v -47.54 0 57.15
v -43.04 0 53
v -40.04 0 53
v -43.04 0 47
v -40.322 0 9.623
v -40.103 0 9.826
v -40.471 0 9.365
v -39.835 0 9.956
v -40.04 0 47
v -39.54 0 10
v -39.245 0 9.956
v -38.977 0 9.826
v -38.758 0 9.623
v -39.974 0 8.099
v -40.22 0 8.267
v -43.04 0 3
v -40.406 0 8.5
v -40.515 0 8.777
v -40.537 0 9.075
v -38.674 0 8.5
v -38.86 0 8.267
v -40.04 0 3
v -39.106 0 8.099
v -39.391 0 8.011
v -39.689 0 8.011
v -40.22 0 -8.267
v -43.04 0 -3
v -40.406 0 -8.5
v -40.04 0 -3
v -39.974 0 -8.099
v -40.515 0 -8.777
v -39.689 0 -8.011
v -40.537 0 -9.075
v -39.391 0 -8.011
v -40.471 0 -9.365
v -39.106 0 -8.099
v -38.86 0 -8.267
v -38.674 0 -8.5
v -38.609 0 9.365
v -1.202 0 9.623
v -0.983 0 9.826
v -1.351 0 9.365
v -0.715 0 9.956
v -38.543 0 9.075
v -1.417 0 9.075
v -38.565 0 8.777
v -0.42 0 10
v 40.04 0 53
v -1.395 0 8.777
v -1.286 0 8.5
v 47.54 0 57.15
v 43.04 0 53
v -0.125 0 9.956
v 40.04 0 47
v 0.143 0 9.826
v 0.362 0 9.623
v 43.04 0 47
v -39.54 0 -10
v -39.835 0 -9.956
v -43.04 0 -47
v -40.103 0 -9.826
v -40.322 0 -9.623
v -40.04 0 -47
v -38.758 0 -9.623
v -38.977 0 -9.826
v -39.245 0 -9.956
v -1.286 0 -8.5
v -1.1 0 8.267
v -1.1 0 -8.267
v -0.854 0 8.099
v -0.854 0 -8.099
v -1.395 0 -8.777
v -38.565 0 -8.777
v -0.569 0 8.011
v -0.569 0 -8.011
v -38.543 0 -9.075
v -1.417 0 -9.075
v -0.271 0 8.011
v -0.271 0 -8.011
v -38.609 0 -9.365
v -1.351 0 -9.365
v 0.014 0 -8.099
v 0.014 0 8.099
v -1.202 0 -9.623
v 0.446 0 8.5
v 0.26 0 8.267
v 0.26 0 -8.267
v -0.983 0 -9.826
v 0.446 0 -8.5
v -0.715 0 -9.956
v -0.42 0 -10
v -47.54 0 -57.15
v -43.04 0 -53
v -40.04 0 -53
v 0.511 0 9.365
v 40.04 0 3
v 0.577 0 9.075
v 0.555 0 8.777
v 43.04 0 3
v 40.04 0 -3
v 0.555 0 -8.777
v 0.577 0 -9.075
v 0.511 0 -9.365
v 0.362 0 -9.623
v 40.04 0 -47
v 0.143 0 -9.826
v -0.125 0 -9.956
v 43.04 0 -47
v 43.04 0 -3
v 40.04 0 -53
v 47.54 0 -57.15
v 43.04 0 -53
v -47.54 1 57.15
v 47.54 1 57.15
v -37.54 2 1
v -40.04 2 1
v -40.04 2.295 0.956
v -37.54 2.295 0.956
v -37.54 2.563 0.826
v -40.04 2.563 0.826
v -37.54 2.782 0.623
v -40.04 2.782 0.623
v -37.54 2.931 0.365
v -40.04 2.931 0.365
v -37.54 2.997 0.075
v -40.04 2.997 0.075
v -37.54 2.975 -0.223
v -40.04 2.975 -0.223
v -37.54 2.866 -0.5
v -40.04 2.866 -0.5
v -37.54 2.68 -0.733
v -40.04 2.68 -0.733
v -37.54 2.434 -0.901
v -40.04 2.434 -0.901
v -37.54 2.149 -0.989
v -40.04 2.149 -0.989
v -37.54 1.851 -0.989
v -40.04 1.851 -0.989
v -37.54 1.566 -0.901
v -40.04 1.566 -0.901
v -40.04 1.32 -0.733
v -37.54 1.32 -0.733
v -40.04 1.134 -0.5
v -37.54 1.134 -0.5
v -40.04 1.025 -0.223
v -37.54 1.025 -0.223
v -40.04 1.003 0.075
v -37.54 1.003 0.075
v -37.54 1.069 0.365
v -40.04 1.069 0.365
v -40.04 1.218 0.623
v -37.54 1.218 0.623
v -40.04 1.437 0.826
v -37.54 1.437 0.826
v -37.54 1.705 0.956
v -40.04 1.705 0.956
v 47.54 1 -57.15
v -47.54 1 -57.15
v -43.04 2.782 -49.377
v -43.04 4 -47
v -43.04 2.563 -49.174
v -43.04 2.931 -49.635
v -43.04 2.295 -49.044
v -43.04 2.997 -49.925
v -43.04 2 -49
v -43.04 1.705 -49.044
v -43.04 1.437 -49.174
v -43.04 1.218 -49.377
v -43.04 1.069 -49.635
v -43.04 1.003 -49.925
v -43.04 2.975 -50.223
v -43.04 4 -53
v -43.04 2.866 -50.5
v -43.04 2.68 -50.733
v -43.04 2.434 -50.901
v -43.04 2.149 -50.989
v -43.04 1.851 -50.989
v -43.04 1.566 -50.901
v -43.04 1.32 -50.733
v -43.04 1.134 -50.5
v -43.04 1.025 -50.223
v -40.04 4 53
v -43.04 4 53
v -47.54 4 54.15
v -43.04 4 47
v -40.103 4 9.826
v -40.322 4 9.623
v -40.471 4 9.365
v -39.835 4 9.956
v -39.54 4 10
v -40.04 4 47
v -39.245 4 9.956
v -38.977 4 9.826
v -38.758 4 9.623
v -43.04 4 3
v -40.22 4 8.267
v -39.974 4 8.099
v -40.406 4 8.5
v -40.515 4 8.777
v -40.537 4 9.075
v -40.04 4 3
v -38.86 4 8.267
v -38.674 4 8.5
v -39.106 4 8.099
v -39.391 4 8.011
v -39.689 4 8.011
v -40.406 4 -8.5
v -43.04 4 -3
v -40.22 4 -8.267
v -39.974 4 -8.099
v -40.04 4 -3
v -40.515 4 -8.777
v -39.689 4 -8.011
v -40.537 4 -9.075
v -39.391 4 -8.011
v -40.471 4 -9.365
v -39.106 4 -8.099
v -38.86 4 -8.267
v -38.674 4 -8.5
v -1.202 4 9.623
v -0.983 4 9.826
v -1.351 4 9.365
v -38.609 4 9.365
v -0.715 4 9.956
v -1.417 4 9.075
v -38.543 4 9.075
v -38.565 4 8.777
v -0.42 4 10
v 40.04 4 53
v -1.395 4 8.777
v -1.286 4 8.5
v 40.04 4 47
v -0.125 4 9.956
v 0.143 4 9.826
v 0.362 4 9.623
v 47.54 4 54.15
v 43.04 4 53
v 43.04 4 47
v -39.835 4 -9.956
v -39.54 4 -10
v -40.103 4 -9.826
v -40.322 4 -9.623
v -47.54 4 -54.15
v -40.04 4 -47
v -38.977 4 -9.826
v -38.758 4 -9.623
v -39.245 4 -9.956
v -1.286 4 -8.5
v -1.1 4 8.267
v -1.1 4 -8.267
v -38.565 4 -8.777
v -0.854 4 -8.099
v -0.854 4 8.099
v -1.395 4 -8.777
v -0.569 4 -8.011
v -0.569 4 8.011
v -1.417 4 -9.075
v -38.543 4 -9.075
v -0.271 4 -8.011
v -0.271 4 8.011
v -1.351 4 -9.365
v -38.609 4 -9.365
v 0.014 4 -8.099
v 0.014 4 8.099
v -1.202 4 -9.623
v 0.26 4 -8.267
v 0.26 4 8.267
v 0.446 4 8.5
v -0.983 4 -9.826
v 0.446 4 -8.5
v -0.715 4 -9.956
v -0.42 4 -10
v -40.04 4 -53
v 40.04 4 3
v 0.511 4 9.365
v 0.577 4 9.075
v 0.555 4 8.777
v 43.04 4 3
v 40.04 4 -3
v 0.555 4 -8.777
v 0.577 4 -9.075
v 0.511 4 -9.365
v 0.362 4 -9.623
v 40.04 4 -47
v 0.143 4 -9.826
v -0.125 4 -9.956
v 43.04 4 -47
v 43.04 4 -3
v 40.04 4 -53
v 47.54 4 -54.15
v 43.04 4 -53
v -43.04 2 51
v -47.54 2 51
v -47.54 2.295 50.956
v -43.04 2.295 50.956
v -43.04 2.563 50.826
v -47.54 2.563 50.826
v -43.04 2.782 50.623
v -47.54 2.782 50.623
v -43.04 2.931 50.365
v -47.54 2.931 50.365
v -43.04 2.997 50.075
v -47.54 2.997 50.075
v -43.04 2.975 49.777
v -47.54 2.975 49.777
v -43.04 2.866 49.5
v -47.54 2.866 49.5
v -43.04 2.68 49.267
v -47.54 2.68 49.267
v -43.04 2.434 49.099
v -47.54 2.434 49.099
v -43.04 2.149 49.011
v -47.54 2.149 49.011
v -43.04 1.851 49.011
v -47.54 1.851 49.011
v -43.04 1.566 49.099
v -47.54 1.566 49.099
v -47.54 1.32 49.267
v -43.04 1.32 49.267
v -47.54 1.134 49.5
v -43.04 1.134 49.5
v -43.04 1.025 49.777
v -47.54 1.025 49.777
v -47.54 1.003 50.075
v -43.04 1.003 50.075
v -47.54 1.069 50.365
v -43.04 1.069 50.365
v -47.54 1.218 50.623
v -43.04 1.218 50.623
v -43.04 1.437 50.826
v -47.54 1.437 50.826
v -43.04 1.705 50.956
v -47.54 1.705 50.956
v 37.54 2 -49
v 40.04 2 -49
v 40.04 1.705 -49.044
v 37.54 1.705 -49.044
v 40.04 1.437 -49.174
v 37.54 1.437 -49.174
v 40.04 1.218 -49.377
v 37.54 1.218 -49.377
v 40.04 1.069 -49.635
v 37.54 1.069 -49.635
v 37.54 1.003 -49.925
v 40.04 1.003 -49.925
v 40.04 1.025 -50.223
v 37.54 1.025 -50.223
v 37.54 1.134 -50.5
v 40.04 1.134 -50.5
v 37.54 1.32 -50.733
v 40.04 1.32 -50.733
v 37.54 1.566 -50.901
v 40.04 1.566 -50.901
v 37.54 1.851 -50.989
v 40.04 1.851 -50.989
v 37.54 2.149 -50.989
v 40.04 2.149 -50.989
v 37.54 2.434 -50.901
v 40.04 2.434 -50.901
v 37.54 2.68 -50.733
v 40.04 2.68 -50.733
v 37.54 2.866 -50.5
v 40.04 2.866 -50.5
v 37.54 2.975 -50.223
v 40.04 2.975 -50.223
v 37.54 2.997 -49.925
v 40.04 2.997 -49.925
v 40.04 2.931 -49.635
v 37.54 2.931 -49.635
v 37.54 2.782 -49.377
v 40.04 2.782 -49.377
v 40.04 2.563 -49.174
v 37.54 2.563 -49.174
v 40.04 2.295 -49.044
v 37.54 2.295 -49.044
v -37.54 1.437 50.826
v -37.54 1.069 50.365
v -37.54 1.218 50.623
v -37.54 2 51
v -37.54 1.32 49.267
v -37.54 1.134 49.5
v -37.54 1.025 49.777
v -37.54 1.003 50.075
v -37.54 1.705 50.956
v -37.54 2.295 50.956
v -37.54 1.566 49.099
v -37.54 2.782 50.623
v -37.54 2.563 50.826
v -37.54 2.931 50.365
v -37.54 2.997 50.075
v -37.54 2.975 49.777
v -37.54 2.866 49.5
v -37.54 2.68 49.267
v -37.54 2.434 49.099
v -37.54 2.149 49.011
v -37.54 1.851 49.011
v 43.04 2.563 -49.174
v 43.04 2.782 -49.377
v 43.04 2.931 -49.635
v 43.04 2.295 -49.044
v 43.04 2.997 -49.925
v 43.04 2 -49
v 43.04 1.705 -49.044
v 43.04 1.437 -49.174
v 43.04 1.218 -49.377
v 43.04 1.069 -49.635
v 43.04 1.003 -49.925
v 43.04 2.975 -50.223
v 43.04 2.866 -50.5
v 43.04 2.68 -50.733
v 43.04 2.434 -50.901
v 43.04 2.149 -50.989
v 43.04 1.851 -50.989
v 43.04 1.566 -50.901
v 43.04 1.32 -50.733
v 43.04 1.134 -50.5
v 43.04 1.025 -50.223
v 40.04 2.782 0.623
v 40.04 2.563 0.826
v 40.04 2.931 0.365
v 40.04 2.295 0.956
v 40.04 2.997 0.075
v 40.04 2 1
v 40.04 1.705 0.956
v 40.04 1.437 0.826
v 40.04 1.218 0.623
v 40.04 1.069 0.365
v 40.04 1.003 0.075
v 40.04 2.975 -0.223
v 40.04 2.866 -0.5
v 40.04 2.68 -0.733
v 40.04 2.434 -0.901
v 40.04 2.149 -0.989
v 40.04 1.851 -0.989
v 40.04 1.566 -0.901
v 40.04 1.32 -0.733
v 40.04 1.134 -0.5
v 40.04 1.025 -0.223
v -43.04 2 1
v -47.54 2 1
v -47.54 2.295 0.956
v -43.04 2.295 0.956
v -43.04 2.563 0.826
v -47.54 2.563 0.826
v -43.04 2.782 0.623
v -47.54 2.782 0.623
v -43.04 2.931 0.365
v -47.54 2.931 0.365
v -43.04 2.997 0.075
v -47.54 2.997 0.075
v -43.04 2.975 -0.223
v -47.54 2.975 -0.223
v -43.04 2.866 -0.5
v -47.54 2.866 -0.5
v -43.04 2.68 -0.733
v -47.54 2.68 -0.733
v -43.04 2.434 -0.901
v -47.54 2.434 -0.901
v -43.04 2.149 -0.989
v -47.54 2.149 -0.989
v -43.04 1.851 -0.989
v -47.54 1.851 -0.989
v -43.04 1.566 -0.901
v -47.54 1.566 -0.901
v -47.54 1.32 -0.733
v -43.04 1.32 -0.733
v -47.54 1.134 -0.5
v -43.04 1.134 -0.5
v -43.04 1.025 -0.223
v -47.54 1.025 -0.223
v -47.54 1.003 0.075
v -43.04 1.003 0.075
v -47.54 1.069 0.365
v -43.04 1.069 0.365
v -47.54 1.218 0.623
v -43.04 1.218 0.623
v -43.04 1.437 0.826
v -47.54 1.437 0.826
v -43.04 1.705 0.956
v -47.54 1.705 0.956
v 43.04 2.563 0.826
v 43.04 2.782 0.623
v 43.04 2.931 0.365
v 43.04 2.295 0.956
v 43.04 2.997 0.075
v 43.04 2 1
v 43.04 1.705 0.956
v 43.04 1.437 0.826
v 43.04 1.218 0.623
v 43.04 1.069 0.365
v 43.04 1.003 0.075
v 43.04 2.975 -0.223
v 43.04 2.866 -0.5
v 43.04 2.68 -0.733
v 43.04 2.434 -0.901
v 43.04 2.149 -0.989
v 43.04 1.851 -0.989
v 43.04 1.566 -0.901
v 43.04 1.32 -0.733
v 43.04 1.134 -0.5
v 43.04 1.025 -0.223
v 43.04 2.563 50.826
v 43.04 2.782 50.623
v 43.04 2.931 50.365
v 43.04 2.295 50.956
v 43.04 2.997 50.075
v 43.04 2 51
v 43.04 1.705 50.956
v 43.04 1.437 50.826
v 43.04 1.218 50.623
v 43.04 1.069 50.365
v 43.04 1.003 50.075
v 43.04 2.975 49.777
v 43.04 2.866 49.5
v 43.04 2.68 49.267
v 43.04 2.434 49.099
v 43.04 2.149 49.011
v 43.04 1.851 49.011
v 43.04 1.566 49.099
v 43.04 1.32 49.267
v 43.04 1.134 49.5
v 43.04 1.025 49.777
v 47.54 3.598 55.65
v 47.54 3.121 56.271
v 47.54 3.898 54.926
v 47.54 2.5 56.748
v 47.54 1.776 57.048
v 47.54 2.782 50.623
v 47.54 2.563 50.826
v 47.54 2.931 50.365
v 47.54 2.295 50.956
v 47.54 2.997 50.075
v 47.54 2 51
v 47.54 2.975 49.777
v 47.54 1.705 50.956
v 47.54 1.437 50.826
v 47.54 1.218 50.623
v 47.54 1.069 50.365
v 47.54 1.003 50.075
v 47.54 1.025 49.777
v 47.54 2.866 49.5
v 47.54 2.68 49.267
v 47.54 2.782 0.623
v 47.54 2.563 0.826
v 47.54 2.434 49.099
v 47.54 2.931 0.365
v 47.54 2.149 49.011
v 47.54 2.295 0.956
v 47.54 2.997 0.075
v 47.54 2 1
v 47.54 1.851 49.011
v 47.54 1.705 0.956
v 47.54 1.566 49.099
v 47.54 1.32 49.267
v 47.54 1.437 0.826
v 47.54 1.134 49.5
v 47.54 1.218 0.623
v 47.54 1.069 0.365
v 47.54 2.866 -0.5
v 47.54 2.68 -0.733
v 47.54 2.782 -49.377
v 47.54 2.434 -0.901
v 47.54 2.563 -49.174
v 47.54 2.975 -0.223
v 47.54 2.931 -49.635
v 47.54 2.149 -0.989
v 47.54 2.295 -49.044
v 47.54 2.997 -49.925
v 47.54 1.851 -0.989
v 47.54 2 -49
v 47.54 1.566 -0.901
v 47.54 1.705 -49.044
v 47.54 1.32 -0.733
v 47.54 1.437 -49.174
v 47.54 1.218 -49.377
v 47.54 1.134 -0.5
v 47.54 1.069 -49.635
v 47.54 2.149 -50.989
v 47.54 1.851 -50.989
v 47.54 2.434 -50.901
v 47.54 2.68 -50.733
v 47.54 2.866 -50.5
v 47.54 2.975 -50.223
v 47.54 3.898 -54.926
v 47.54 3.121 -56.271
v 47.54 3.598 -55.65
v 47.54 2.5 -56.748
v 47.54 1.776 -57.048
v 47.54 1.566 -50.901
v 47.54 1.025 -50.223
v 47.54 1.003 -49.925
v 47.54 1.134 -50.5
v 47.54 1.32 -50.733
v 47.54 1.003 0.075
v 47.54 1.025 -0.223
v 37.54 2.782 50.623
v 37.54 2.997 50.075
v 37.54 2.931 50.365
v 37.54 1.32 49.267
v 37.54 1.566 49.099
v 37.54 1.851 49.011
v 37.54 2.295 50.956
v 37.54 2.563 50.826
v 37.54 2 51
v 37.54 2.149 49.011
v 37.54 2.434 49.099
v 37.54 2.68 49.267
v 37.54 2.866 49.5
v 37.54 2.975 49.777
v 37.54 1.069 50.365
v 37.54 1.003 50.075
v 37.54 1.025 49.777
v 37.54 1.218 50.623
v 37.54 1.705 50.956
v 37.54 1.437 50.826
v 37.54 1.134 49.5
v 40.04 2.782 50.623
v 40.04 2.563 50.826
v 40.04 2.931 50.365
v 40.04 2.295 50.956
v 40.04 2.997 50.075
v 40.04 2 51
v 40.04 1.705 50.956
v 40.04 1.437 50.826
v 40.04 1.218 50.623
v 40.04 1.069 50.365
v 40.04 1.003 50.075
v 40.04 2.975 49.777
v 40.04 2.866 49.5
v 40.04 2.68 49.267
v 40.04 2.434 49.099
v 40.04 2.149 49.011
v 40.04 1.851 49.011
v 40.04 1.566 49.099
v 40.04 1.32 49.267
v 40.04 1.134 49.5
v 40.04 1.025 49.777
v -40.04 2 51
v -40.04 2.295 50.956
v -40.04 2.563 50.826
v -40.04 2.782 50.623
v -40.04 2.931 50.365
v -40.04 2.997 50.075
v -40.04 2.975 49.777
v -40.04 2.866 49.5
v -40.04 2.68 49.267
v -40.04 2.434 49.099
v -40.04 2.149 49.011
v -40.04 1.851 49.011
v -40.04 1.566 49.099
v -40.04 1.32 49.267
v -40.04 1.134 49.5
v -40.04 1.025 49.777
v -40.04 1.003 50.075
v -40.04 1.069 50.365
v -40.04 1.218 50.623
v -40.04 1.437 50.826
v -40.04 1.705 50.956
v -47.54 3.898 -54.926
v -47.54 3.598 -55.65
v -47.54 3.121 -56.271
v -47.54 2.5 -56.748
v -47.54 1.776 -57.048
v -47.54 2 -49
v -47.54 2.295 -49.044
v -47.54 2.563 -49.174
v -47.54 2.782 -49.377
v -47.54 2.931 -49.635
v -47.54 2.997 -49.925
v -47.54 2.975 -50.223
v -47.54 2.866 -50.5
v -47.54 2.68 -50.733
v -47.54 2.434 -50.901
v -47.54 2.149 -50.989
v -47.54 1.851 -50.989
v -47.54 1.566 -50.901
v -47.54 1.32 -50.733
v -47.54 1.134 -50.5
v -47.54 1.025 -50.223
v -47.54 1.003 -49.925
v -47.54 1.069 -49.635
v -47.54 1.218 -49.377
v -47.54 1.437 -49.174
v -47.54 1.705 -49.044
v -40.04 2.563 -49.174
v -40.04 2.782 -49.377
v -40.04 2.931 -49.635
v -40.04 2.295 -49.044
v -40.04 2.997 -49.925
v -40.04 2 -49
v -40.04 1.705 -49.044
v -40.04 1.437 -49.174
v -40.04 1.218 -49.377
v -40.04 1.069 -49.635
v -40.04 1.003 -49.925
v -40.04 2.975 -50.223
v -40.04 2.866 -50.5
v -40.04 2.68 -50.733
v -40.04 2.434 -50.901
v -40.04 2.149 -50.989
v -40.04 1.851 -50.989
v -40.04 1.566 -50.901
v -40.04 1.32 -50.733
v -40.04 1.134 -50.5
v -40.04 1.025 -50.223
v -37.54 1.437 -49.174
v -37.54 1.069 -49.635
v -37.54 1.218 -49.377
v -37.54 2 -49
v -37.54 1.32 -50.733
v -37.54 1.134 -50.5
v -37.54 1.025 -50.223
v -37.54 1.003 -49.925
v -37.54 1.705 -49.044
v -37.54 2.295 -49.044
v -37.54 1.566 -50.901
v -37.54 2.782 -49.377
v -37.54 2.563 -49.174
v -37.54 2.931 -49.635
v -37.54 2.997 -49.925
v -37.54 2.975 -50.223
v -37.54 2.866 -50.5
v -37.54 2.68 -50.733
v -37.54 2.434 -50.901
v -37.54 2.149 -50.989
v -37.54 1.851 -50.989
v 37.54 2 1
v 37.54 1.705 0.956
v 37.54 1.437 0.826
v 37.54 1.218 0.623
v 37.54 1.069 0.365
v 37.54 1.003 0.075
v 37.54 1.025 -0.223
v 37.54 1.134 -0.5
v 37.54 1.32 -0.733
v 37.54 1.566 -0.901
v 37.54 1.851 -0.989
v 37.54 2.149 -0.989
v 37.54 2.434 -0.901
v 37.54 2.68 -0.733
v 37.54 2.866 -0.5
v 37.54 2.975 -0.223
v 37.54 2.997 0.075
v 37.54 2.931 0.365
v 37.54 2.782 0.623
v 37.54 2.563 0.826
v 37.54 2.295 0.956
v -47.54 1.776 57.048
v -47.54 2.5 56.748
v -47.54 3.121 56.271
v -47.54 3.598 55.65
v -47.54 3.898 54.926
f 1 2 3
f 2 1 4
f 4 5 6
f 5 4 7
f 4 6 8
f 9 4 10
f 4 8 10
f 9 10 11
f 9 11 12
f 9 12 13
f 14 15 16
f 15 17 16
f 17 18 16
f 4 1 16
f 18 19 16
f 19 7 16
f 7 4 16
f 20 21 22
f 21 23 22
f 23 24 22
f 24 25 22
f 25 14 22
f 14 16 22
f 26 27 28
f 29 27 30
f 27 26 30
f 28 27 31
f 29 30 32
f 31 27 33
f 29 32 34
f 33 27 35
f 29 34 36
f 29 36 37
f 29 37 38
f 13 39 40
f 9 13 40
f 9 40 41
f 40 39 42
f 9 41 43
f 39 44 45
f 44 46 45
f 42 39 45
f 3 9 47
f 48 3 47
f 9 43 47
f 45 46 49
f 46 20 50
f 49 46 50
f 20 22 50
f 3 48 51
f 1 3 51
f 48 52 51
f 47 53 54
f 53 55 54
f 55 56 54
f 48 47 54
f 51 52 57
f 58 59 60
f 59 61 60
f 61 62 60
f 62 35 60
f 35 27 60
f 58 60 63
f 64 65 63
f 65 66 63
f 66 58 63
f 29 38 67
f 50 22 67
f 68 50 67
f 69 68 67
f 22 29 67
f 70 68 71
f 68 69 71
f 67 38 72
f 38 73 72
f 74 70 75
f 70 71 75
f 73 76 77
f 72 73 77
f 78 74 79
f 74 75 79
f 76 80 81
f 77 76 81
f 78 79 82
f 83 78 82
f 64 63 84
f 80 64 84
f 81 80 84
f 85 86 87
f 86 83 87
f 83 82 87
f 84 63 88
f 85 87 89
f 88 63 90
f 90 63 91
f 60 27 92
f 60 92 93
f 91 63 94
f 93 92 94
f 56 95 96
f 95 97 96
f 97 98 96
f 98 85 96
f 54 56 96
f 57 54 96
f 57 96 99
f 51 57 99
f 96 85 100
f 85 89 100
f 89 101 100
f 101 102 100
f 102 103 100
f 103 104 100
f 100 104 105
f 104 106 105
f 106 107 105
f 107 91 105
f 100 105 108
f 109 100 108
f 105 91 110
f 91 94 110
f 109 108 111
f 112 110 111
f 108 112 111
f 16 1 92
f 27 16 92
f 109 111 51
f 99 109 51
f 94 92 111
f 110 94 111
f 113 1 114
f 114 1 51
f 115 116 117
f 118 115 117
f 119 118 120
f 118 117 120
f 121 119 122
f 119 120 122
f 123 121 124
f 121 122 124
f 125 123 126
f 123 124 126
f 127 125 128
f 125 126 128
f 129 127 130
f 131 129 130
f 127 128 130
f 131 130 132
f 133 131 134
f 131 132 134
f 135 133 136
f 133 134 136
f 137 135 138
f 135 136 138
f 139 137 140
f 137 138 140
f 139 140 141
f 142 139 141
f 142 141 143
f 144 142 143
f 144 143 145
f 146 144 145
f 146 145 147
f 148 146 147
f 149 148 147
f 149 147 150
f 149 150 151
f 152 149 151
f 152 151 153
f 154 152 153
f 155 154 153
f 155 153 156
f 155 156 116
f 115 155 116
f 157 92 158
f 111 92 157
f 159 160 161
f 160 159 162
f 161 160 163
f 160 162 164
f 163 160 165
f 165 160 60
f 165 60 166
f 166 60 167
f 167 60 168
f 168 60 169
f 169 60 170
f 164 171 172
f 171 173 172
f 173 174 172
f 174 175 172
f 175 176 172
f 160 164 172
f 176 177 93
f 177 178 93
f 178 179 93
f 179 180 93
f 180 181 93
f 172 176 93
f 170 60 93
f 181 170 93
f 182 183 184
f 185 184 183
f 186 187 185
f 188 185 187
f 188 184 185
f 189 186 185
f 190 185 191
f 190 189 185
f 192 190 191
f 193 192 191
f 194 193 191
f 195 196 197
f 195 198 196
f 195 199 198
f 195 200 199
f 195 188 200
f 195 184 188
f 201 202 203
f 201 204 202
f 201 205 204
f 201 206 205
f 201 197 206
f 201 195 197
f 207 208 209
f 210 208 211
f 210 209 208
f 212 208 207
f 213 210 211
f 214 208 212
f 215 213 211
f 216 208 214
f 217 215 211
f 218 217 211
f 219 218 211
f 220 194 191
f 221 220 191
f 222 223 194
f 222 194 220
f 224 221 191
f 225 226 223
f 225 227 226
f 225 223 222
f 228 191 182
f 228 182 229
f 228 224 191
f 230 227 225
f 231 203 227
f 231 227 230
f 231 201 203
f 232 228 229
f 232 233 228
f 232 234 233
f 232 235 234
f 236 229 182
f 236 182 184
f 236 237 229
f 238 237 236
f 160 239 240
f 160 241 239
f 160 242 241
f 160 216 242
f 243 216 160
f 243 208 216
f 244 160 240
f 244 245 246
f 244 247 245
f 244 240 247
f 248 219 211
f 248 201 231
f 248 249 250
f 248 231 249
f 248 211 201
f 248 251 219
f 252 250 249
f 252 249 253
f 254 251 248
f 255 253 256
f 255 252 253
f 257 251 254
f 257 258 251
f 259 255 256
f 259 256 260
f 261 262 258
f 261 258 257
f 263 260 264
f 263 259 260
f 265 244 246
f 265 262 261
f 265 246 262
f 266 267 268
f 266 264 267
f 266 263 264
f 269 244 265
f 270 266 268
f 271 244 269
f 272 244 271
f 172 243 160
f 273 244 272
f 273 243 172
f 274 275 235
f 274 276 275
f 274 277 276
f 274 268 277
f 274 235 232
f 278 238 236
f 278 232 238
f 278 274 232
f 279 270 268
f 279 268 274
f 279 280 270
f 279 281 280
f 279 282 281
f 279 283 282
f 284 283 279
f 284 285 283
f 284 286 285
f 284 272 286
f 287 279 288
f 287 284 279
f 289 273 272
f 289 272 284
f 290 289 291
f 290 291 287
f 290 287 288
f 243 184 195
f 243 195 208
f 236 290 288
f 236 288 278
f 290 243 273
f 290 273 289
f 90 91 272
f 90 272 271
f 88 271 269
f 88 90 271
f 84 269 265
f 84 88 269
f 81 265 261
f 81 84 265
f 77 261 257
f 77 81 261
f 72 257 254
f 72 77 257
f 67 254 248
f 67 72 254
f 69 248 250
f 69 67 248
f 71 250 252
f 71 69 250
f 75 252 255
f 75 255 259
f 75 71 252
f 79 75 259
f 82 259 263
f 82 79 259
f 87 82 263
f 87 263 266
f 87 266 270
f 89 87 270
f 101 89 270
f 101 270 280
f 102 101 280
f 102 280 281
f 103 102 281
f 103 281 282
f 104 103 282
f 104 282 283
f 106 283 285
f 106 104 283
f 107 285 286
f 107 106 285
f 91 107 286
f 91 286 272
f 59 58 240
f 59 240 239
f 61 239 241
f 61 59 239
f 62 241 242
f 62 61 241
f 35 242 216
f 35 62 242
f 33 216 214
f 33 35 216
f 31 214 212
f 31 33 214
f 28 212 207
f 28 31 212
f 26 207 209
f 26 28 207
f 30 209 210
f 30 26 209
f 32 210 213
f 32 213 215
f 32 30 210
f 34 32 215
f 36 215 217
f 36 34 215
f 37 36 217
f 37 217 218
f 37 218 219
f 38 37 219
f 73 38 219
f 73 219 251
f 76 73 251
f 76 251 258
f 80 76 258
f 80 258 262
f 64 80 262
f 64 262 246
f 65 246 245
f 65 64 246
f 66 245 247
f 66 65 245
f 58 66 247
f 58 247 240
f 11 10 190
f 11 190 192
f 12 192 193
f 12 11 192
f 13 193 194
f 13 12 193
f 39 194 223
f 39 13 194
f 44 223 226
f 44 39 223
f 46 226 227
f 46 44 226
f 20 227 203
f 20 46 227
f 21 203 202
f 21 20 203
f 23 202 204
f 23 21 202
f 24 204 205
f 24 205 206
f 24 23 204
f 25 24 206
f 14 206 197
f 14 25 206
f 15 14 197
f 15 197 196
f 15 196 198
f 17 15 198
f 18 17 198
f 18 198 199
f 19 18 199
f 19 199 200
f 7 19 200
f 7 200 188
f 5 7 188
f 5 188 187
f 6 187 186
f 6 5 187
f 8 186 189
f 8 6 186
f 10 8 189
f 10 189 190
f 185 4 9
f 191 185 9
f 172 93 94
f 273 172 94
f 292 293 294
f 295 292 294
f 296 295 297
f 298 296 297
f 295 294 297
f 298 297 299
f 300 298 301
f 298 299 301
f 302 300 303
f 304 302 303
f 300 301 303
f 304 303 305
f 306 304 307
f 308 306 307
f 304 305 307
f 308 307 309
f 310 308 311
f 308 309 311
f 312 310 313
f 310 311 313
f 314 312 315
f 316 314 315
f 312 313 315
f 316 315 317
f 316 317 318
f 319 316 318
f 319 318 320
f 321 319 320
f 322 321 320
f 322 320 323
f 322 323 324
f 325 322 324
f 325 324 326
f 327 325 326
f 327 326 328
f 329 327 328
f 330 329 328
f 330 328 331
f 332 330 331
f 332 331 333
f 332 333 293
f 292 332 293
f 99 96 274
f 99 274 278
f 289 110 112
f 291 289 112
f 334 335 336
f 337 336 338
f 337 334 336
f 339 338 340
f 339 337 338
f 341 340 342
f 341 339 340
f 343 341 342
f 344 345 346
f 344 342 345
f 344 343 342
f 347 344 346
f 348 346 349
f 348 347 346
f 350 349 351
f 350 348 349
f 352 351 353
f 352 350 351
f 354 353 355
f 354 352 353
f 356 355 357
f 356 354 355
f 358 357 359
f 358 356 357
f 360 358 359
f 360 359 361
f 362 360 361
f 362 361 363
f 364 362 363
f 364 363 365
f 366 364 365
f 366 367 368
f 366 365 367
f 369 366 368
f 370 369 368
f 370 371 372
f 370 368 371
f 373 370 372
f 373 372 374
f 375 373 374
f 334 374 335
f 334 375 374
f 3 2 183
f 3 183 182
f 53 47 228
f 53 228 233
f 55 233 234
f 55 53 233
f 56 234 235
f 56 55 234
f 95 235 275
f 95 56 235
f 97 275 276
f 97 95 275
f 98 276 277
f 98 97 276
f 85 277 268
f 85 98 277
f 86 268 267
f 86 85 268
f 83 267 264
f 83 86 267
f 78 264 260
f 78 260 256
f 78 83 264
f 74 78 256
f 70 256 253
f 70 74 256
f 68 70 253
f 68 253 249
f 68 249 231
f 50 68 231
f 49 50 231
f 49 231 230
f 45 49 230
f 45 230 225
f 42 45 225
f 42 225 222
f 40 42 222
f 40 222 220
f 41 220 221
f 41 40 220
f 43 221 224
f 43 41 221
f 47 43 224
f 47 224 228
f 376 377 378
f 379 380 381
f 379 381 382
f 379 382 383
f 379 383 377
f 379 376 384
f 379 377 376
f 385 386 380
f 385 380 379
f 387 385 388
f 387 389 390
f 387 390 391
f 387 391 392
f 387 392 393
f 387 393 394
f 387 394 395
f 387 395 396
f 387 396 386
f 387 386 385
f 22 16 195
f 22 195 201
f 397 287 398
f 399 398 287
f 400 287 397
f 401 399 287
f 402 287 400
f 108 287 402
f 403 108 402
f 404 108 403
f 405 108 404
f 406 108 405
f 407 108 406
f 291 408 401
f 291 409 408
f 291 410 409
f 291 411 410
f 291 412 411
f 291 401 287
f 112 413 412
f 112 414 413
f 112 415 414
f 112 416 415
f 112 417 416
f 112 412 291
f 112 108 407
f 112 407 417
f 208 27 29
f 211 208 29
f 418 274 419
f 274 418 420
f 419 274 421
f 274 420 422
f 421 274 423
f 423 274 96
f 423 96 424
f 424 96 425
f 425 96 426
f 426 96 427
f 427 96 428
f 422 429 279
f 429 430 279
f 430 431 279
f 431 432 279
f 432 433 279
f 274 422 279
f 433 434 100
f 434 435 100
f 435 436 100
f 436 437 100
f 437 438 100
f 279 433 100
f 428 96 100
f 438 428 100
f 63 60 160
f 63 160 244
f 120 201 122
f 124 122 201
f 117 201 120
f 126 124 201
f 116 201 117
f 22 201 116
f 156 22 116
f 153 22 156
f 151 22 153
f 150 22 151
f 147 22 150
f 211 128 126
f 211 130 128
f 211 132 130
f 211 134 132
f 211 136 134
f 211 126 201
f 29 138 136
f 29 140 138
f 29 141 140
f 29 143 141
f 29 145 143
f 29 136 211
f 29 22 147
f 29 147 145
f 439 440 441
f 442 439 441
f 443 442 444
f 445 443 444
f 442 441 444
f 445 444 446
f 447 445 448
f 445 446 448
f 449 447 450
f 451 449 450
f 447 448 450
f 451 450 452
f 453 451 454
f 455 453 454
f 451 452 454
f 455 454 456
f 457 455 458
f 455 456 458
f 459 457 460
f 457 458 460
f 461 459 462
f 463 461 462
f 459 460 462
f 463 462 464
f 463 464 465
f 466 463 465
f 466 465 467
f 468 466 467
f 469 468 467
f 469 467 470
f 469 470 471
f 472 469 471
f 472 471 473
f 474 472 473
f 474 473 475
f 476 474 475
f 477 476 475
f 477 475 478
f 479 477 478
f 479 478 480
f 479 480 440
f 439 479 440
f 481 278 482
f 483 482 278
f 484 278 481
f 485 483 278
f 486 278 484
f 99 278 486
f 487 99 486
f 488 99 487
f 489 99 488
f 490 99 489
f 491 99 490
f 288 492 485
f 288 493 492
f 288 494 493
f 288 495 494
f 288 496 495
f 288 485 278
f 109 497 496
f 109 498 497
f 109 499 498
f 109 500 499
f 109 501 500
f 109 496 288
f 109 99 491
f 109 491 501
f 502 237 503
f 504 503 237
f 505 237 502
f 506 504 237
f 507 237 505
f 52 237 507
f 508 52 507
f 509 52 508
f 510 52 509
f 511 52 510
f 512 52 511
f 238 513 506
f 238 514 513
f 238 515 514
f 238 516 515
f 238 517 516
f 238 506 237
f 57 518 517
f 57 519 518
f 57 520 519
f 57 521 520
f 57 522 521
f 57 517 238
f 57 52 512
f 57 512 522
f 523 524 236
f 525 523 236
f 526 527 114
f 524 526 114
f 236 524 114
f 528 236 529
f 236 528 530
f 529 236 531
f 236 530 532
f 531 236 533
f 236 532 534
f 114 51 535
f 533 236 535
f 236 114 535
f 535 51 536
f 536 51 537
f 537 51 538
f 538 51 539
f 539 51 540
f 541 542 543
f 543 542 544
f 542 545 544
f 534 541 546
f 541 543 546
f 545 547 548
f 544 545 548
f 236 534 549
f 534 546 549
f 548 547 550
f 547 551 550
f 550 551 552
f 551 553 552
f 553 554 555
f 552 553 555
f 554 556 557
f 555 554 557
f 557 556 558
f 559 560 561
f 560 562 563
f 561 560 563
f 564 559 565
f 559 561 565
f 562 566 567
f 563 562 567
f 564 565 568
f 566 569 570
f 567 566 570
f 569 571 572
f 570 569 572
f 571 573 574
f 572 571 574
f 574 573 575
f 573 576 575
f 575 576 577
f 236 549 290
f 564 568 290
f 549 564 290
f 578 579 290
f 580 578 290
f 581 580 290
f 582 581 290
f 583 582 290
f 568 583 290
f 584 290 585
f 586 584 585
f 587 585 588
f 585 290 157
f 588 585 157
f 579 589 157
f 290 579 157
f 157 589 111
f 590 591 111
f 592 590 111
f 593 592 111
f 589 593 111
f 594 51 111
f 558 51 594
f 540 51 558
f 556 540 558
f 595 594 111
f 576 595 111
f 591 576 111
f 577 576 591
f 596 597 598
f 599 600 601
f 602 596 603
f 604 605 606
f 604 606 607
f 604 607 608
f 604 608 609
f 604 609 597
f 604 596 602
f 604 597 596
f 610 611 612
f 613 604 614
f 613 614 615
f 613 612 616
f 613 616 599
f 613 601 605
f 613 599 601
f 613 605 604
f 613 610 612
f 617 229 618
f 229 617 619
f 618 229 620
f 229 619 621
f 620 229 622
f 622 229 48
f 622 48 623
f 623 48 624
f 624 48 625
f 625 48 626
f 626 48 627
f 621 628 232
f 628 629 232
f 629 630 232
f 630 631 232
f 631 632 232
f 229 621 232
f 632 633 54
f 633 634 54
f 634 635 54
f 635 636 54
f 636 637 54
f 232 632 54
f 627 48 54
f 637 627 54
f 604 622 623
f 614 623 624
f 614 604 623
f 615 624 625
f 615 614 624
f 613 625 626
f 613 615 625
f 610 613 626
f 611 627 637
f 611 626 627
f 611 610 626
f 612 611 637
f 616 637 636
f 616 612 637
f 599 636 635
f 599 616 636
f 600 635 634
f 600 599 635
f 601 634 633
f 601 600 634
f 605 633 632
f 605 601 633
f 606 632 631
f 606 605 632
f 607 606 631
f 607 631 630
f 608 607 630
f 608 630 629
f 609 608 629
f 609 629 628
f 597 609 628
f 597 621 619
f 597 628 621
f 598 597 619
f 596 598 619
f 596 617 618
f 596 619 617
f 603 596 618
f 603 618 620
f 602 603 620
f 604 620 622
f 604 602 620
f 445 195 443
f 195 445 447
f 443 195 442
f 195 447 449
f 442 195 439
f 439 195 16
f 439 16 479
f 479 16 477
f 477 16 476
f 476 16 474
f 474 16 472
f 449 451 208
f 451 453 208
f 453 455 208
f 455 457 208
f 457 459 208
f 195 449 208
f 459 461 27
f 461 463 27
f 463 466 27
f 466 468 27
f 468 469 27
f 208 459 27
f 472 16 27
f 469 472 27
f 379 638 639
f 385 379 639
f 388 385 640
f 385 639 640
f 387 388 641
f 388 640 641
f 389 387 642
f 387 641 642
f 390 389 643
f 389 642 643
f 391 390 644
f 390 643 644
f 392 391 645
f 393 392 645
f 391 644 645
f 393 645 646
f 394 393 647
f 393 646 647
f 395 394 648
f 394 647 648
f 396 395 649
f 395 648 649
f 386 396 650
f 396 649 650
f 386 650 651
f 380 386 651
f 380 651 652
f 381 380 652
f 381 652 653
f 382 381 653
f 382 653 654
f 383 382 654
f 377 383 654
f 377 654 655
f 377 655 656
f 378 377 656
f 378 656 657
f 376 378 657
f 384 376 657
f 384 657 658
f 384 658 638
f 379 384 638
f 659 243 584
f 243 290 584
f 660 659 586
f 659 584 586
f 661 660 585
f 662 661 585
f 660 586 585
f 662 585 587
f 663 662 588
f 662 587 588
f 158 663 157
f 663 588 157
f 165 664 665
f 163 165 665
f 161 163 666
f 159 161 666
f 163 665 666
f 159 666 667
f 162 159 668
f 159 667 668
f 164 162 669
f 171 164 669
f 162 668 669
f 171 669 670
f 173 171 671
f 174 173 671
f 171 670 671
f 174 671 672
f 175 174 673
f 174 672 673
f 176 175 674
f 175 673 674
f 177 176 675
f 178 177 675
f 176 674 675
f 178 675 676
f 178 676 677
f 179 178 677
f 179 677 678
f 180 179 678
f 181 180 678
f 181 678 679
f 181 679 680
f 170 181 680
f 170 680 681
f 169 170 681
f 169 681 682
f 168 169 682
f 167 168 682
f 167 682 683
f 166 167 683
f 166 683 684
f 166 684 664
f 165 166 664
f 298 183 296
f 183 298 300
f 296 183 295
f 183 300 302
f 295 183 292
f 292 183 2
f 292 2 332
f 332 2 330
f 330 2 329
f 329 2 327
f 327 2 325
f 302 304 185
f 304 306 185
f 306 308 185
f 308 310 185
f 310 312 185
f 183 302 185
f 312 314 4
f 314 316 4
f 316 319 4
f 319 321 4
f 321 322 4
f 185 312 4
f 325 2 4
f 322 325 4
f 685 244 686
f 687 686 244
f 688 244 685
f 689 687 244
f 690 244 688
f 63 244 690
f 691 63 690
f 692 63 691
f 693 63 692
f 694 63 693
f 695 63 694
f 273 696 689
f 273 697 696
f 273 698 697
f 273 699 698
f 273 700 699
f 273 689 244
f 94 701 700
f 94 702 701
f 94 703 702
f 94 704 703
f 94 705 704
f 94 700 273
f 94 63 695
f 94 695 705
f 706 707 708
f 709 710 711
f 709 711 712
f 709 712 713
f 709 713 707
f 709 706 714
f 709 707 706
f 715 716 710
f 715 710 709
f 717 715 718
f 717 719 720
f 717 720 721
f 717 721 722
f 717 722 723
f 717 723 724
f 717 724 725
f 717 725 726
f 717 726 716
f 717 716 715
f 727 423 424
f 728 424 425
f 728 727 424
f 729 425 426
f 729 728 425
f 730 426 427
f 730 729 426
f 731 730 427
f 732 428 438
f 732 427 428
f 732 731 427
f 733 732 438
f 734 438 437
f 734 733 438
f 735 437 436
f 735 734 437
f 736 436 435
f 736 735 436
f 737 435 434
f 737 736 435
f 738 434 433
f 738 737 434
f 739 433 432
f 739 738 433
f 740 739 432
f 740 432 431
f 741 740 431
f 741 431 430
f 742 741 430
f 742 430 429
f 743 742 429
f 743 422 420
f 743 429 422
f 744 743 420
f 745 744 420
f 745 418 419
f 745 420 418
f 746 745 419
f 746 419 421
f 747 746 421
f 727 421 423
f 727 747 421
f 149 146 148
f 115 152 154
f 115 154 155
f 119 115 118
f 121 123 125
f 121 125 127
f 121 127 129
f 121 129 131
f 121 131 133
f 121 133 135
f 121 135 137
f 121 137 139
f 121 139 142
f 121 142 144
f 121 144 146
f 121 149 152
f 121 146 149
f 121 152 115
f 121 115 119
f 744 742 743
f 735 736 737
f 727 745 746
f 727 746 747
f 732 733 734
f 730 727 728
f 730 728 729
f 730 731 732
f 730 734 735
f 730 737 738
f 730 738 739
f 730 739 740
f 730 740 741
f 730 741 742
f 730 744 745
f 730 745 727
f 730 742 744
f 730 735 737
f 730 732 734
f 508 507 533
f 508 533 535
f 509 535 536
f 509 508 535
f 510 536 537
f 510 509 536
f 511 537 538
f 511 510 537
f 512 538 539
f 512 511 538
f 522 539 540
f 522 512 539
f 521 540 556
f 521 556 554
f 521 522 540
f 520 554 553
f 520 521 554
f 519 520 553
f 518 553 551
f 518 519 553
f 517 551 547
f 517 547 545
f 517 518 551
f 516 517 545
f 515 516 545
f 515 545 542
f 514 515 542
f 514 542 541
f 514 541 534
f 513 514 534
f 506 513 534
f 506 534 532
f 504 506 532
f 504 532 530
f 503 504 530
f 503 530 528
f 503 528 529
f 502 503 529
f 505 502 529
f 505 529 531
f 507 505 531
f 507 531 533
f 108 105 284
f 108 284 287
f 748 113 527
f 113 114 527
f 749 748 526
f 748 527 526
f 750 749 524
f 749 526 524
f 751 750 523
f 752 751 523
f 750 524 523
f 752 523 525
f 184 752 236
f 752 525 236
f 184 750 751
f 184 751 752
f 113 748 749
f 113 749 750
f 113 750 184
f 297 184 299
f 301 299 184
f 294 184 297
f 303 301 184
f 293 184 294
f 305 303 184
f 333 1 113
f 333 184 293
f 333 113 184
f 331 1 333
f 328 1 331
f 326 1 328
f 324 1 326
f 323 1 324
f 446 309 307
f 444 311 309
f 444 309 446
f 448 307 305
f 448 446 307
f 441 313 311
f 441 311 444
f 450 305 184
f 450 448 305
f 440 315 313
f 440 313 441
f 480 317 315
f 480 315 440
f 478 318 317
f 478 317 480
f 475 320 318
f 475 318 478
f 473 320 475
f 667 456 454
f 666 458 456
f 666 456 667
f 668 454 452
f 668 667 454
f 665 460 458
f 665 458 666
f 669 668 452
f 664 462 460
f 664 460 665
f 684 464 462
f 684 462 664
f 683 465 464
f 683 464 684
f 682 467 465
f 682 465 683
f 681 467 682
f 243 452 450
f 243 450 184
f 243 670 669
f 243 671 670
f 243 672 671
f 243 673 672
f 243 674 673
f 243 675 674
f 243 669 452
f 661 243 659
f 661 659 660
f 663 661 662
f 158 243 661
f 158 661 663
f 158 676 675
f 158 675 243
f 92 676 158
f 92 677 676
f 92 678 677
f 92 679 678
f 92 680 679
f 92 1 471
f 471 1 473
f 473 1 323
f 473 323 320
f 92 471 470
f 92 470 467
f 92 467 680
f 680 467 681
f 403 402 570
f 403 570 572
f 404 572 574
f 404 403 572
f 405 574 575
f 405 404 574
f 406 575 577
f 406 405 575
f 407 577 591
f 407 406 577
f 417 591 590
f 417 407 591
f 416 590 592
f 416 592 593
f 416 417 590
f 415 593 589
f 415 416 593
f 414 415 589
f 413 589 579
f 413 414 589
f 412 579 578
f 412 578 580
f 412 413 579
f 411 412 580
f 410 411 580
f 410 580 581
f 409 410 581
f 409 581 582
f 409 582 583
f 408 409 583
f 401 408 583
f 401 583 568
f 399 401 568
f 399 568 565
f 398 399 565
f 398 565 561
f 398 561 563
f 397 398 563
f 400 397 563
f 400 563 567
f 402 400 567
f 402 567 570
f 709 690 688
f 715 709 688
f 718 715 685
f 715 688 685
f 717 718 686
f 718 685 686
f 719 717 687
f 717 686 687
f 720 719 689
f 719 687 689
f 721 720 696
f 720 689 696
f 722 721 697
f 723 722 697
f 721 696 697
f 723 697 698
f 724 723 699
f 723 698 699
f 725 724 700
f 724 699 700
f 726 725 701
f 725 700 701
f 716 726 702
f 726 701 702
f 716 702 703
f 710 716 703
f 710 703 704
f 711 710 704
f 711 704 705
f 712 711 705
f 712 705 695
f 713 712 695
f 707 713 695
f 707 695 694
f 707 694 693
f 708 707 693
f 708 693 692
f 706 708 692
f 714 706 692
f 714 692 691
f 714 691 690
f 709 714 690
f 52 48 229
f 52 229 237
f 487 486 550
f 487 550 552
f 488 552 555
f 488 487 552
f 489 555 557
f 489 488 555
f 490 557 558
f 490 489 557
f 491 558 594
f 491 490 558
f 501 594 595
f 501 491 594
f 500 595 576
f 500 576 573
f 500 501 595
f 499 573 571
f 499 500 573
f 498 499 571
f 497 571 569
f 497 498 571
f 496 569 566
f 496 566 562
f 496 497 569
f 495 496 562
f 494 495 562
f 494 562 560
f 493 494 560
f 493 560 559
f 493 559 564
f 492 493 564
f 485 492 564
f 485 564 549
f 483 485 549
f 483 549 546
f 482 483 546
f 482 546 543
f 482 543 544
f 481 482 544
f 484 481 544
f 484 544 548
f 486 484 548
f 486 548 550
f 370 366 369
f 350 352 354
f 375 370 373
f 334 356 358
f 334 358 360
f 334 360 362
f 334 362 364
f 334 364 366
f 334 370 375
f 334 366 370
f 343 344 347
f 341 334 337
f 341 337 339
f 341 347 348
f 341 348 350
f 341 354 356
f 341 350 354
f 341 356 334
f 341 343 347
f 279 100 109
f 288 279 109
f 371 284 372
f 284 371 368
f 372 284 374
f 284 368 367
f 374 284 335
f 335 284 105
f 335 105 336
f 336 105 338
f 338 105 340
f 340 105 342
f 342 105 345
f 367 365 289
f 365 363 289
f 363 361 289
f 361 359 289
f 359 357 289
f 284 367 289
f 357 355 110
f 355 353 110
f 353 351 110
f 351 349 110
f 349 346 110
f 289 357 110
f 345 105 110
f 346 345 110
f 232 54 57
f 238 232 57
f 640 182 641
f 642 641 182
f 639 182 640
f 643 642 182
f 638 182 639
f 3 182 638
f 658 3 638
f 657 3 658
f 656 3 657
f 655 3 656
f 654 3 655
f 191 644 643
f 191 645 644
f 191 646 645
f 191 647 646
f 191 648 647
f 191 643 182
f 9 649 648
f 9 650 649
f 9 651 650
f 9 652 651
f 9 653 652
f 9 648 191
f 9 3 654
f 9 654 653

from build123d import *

# Parameters (mm, degrees)
ESQUISSE1_W             = 95.08
ESQUISSE1_H             = 114.3
ESQUISSE1_R             = 1
ESQUISSE1_W_2           = 3
ESQUISSE1_H_2           = 6
BOSS_EXTRU_1_DEPTH      = 4
ESQUISSE2_R             = 1
ENL_V_MAT_EXTRU_1_DEPTH = 10
ENL_V_START             = -10
ESQUISSE3_R             = 1
ENL_V_MAT_EXTRU_2_DEPTH = 10
CONG_1_R                = 3


with BuildPart() as part:
    # Esquisse1 → Boss.-Extru.1 (new body)
    with BuildSketch(Plane(origin=(0, 0, 0), x_dir=(1, 0, 0), z_dir=(0, 1, 0))):
        Rectangle(ESQUISSE1_W, ESQUISSE1_H)
        with Locations(Location((-39.54, -9, 0), (0, 0, 270))):
            Circle(ESQUISSE1_R, mode=Mode.SUBTRACT)
        with Locations(Location((-0.42, -9, 0), (0, 0, 270))):
            Circle(ESQUISSE1_R, mode=Mode.SUBTRACT)
        with Locations(Location((-0.42, 9, 0), (0, 0, 90))):
            Circle(ESQUISSE1_R, mode=Mode.SUBTRACT)
        with Locations(Location((-39.54, 9, 0), (0, 0, 90))):
            Circle(ESQUISSE1_R, mode=Mode.SUBTRACT)
        with Locations((41.54, 0)):
            Rectangle(ESQUISSE1_W_2, ESQUISSE1_H_2, mode=Mode.SUBTRACT)
        with Locations((41.54, -50)):
            Rectangle(ESQUISSE1_W_2, ESQUISSE1_H_2, mode=Mode.SUBTRACT)
        with Locations((41.54, 50)):
            Rectangle(ESQUISSE1_W_2, ESQUISSE1_H_2, mode=Mode.SUBTRACT)
        with Locations((-41.54, -50)):
            Rectangle(ESQUISSE1_W_2, ESQUISSE1_H_2, mode=Mode.SUBTRACT)
        with Locations((-41.54, 50)):
            Rectangle(ESQUISSE1_W_2, ESQUISSE1_H_2, mode=Mode.SUBTRACT)
        with Locations((-41.54, 0)):
            Rectangle(ESQUISSE1_W_2, ESQUISSE1_H_2, mode=Mode.SUBTRACT)
    extrude(amount=BOSS_EXTRU_1_DEPTH)

    # Esquisse2 → Enlèv. mat.-Extru.1 (cut)
    with BuildSketch(Plane.ZY.offset(47.54)):
        with Locations((-50, 2)):
            Circle(ESQUISSE2_R)
        with Locations((0, 2)):
            Circle(ESQUISSE2_R)
        with Locations((50, 2)):
            Circle(ESQUISSE2_R)
    extrude(amount=-ENL_V_MAT_EXTRU_1_DEPTH, mode=Mode.SUBTRACT)

    # Esquisse3 → Enlèv. mat.-Extru.2 (cut)
    with BuildSketch(Plane(origin=(47.54, 0, 0), x_dir=(0, 0, -1), z_dir=(1, 0, 0)).offset(ENL_V_START)):
        with Locations(Location((-50, 2, 0), (0, 0, 180))):
            Circle(ESQUISSE3_R)
        with Locations(Location((0, 2, 0), (0, 0, 180))):
            Circle(ESQUISSE3_R)
        with Locations(Location((50, 2, 0), (0, 0, 180))):
            Circle(ESQUISSE3_R)
    extrude(amount=ENL_V_MAT_EXTRU_2_DEPTH, mode=Mode.SUBTRACT)

    # Congé1
    cong_1_edges = [part.edges().sort_by_distance(p)[0] for p in [
        (0, 4, 57.15),
        (0, 4, -57.15),
    ]]
    fillet(cong_1_edges, radius=CONG_1_R)


solid = part.part
